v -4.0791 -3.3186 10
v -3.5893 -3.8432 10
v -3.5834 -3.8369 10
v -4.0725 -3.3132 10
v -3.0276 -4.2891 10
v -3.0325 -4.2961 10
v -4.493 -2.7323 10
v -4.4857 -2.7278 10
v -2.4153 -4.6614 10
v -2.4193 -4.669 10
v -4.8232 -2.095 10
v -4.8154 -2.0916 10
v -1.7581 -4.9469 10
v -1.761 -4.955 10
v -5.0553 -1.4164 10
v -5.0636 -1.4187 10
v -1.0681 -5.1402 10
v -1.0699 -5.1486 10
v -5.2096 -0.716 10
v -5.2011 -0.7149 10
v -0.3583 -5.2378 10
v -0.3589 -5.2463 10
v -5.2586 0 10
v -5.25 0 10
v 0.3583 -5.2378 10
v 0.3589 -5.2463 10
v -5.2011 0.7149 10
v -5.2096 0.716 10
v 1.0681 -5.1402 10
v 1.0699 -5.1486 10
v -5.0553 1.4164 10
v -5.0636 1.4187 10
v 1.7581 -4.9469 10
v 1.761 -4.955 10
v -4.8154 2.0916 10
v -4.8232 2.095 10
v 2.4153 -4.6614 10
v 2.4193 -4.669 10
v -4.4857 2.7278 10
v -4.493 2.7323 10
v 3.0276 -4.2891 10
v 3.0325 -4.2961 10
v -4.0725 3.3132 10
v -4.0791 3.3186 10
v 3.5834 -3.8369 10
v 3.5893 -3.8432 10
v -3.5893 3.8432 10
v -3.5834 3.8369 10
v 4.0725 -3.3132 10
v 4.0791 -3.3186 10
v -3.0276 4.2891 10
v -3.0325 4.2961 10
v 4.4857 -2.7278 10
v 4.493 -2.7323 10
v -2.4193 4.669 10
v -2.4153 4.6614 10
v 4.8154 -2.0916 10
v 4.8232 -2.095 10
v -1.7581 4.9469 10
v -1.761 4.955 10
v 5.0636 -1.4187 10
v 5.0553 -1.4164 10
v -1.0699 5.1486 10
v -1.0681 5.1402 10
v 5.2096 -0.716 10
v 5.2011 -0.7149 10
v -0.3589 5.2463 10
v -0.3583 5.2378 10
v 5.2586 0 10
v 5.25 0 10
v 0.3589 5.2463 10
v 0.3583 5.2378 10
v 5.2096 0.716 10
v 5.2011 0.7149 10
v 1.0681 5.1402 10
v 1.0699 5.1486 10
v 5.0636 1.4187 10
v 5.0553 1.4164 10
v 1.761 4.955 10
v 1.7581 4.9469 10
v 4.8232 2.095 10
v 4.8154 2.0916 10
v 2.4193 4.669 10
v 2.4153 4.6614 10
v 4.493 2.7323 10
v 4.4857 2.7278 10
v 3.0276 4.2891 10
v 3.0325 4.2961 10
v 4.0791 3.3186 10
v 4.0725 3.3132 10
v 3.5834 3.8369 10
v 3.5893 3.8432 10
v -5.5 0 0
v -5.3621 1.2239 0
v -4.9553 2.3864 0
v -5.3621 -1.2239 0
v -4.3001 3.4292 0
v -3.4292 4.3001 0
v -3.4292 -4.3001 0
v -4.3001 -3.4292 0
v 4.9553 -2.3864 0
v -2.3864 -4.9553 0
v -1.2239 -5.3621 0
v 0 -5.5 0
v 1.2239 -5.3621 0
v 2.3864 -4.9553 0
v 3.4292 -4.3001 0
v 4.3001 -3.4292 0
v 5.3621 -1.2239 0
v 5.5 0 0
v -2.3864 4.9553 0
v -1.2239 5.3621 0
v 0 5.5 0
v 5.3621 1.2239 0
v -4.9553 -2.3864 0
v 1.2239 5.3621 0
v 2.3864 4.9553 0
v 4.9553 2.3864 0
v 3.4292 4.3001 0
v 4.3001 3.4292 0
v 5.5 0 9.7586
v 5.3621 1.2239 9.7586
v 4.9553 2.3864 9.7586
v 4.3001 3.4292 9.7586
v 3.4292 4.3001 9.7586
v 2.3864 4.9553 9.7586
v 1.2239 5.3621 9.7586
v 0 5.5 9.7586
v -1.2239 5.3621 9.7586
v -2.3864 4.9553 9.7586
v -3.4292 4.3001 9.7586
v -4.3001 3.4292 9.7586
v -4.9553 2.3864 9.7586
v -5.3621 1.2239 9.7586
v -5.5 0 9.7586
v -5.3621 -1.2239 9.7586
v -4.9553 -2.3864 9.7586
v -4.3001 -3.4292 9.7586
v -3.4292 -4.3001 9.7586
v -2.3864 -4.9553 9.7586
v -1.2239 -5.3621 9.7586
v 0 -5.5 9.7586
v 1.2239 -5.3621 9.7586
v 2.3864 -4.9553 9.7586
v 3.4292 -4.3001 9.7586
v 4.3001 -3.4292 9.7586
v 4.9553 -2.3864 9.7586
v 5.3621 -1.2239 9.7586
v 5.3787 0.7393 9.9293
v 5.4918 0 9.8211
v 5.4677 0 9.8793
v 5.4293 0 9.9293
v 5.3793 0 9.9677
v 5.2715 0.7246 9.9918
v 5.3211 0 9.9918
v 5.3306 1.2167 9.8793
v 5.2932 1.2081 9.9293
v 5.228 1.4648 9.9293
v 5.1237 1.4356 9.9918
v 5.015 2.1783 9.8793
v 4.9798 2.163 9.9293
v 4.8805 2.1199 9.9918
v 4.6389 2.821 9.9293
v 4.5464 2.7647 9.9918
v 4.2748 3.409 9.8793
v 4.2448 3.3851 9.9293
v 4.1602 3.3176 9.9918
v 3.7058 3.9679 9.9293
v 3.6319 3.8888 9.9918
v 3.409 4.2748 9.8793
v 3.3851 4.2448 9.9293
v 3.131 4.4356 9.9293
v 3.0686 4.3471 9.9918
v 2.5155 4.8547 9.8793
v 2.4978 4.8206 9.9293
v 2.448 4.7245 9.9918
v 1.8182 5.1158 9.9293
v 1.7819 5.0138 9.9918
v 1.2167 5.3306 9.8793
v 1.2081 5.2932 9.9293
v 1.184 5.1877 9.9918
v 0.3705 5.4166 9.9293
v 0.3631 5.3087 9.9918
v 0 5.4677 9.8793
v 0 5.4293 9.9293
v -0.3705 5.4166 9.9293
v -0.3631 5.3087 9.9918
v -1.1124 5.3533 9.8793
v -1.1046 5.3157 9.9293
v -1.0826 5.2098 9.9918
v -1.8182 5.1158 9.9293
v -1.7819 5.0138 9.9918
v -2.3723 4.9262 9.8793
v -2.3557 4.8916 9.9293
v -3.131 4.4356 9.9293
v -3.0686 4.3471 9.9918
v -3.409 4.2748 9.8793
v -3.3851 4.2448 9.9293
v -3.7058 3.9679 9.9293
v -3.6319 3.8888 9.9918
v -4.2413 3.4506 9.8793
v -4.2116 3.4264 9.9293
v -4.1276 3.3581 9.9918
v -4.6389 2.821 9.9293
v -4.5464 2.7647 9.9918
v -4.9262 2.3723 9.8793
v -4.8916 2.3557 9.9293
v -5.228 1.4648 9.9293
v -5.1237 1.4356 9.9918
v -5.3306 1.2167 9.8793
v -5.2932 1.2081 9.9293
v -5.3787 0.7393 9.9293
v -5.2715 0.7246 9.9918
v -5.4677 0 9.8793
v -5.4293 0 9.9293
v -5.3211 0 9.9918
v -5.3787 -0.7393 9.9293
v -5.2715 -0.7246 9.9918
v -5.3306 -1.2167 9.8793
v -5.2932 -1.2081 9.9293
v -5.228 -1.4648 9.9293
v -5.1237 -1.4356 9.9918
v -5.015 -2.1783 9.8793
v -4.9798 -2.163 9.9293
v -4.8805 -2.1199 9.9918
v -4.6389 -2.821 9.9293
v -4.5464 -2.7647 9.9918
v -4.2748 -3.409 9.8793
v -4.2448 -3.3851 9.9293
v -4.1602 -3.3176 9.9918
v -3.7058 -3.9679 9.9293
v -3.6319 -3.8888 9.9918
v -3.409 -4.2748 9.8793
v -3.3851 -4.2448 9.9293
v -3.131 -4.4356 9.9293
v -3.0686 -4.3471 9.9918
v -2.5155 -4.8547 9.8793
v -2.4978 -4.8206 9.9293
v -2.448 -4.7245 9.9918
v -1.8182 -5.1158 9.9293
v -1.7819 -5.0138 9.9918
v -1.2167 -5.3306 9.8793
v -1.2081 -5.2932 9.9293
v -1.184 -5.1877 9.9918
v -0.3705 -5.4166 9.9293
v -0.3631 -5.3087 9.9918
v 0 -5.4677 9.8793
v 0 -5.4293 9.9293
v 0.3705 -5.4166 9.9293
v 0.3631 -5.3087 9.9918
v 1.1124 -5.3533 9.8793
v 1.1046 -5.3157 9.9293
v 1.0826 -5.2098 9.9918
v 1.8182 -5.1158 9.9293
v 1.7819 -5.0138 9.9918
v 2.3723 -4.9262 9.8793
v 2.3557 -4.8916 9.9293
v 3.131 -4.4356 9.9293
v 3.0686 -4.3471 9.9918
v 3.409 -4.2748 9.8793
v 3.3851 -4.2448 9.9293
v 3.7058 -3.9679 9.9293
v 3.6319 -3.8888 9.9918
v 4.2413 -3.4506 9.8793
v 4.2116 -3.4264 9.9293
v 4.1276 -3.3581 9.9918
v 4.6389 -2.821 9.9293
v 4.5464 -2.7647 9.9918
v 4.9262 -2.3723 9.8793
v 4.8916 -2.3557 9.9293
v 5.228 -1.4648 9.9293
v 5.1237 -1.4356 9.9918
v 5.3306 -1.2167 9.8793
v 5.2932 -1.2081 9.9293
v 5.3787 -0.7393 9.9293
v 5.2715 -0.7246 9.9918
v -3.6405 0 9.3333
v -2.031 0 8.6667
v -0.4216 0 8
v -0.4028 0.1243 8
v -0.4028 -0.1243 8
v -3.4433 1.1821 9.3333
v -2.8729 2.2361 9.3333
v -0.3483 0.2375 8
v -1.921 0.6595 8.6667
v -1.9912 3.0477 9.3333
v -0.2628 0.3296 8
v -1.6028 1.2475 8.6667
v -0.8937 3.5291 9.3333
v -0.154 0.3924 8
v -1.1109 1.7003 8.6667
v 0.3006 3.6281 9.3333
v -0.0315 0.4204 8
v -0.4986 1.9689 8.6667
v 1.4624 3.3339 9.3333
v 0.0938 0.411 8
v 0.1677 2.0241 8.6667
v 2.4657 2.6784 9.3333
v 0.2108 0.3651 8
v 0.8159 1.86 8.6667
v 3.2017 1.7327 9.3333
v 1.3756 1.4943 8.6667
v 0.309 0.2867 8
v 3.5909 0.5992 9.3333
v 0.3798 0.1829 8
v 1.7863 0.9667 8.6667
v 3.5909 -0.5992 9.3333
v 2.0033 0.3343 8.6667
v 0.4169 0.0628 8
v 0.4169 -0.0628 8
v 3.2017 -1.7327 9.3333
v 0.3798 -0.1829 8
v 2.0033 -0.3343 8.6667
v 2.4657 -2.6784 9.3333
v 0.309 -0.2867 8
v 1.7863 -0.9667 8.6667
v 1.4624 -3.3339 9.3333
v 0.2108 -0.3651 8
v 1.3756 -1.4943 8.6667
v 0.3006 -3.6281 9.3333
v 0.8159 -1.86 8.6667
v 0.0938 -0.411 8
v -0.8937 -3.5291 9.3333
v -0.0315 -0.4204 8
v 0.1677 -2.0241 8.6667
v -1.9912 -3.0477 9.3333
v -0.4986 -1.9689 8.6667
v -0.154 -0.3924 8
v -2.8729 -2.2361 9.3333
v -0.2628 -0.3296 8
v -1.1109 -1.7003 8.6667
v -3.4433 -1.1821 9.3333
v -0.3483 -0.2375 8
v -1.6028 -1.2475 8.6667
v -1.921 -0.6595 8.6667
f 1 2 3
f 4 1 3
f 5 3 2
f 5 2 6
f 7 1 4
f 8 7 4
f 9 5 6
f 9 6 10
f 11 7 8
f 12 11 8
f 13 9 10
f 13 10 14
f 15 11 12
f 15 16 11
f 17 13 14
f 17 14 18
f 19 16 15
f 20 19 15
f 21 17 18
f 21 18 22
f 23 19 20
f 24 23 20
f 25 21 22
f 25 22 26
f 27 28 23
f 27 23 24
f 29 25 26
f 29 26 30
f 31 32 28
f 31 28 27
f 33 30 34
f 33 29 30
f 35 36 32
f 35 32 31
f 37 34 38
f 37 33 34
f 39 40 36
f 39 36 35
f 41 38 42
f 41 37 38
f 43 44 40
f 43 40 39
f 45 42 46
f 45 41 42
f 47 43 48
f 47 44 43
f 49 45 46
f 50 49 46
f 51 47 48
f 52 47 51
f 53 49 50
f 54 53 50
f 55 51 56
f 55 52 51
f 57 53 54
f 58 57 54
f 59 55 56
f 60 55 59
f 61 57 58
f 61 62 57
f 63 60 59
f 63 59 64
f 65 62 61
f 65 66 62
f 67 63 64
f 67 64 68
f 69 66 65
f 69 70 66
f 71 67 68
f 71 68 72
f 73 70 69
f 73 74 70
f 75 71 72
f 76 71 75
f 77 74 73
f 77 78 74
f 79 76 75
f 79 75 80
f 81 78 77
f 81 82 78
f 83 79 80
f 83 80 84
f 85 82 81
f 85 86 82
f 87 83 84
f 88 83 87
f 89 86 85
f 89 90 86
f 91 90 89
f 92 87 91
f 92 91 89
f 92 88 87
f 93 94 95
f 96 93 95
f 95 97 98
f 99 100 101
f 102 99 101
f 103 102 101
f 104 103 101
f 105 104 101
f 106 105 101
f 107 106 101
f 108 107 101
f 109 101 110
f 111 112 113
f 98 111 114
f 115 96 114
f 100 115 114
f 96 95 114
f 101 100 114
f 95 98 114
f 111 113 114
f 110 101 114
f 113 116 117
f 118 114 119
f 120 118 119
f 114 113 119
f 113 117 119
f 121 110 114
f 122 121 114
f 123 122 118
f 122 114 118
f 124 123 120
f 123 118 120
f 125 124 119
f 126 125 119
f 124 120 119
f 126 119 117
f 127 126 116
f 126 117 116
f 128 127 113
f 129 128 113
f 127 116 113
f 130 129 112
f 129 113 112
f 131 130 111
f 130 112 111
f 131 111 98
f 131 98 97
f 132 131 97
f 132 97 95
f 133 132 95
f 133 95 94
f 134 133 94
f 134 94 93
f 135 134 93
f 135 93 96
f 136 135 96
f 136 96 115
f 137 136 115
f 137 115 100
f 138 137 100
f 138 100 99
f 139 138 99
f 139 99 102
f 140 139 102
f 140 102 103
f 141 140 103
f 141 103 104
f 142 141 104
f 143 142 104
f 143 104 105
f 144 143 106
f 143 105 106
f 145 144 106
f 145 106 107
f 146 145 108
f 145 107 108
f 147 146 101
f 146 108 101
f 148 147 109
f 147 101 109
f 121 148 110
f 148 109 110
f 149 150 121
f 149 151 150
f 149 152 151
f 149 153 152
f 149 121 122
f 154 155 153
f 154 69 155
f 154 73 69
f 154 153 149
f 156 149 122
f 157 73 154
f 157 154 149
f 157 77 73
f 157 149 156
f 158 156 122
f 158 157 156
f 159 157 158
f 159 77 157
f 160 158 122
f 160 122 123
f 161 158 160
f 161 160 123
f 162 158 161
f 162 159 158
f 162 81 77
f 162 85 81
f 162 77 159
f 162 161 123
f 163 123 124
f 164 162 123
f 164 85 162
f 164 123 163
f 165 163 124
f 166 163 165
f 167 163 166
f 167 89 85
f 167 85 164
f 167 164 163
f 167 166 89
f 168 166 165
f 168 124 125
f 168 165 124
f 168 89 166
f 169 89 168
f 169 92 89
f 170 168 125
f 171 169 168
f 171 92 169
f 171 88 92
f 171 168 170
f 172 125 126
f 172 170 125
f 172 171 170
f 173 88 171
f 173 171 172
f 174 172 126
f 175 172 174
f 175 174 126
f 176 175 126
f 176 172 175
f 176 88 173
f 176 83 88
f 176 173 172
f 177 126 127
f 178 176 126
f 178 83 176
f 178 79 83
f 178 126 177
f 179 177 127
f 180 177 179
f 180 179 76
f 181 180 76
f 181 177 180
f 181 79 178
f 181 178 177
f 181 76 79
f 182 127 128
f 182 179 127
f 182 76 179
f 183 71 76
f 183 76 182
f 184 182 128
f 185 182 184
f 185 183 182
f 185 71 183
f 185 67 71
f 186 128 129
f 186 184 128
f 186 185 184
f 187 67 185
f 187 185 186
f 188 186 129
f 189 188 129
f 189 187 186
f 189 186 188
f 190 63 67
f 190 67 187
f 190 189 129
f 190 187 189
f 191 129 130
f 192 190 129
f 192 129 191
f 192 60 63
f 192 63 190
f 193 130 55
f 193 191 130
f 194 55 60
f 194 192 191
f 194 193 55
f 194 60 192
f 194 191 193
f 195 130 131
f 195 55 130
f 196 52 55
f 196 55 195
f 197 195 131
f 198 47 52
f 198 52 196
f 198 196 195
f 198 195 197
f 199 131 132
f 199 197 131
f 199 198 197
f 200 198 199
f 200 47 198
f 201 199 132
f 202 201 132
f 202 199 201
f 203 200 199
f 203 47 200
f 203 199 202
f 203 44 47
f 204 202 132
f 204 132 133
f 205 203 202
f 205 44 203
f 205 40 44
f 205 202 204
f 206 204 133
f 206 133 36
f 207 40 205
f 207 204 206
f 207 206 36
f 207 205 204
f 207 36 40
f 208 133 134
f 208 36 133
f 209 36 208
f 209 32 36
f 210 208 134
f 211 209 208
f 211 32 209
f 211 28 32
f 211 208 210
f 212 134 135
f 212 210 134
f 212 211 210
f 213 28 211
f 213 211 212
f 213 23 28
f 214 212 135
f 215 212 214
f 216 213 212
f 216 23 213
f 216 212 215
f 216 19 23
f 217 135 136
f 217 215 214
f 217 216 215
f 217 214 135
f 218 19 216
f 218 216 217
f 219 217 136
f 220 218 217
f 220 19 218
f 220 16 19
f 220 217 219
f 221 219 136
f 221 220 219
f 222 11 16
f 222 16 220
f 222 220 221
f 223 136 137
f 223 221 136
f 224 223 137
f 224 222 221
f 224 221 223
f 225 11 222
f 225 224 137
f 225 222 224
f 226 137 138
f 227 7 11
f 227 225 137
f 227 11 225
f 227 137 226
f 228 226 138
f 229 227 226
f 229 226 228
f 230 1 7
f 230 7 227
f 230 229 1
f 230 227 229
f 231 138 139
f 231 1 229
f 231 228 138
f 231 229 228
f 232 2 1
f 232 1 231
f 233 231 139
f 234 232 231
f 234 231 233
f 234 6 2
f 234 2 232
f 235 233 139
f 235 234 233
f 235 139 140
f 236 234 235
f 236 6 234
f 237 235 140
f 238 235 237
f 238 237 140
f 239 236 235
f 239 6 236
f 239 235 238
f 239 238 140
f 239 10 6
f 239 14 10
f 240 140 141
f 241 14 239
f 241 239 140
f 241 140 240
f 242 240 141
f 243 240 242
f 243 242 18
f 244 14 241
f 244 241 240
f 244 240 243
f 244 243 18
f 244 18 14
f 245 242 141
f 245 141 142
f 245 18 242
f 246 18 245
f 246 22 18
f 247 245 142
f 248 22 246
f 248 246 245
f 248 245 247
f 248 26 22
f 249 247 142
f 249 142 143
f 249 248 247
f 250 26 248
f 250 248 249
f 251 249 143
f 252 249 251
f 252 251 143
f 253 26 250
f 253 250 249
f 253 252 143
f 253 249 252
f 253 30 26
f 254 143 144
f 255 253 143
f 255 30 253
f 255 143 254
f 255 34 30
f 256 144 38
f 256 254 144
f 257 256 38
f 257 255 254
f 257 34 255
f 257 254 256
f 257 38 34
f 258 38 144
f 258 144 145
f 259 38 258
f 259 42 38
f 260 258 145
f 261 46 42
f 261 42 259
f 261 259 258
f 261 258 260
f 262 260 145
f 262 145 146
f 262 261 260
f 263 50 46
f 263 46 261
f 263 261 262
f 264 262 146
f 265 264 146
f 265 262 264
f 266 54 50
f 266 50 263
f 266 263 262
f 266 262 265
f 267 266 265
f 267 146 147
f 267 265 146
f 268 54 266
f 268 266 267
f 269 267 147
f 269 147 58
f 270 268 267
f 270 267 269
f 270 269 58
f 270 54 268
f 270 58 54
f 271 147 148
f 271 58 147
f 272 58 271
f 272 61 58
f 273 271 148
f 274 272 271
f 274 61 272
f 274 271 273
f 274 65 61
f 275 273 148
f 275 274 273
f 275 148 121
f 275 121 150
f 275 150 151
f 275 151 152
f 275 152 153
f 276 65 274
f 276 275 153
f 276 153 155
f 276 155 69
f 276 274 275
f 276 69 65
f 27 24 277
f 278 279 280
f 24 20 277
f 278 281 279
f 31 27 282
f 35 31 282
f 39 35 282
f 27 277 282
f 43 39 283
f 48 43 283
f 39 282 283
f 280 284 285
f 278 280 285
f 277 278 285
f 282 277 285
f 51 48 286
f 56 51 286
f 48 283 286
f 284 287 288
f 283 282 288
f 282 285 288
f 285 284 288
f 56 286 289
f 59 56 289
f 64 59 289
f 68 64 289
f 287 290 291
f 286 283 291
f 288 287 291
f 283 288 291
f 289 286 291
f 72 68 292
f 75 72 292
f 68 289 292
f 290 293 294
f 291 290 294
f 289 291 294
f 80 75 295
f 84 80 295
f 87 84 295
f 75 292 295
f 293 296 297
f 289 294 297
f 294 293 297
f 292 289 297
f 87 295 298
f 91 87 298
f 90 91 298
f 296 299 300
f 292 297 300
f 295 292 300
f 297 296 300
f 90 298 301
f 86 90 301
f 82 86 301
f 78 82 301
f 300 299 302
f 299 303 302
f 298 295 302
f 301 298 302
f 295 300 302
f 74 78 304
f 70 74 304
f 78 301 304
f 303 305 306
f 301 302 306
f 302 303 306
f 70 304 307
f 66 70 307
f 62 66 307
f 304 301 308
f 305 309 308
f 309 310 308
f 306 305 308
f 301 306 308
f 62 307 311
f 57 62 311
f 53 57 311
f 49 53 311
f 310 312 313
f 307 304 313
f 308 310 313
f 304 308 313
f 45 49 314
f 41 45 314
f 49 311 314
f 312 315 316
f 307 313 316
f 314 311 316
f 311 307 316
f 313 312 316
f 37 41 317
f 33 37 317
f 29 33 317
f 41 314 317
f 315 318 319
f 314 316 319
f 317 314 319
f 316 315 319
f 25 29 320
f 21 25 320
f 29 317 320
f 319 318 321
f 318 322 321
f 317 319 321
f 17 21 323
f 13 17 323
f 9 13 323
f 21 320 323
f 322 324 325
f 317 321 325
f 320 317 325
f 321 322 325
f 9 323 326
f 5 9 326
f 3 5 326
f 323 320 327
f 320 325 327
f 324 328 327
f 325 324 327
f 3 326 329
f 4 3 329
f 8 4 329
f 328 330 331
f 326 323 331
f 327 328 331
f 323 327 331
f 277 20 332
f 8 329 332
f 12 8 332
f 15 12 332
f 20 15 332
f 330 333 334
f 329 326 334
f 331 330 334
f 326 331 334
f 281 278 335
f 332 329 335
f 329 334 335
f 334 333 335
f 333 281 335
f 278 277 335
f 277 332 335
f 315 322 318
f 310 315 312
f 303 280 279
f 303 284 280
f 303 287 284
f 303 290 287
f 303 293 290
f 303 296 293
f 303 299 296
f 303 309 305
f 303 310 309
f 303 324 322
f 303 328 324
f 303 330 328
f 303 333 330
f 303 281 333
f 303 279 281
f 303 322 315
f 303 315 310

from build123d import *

# Parameters (mm, degrees)
F0_R           = 5.5
F1_DEPTH       = 10
F2_R           = 0.241421
F4_D           = 0.1
F4_CSINK_D     = 10.5
F4_CSINK_ANGLE = 135
F5_DEPTH       = 8


with BuildPart() as f1:
    # F0 (on Top) → F1 (new body)
    with BuildSketch(Plane.XY):
        Circle(F0_R)
    extrude(amount=F1_DEPTH)

    # F2
    f2_edges = [f1.edges().sort_by_distance(p)[0] for p in [
        (-5.5, 0, 10),
    ]]
    fillet(f2_edges, radius=F2_R)

    # F4 (through all)
    with Locations(Plane.XY.offset(10)):
        with Locations((0, 0)):
            CounterSinkHole(F4_D / 2, F4_CSINK_D / 2, counter_sink_angle=F4_CSINK_ANGLE)

    # F0 (on Top) → F5 (join)
    with BuildSketch(Plane.XY):
        Circle(F0_R)
    extrude(amount=F5_DEPTH)


solid = f1.part
